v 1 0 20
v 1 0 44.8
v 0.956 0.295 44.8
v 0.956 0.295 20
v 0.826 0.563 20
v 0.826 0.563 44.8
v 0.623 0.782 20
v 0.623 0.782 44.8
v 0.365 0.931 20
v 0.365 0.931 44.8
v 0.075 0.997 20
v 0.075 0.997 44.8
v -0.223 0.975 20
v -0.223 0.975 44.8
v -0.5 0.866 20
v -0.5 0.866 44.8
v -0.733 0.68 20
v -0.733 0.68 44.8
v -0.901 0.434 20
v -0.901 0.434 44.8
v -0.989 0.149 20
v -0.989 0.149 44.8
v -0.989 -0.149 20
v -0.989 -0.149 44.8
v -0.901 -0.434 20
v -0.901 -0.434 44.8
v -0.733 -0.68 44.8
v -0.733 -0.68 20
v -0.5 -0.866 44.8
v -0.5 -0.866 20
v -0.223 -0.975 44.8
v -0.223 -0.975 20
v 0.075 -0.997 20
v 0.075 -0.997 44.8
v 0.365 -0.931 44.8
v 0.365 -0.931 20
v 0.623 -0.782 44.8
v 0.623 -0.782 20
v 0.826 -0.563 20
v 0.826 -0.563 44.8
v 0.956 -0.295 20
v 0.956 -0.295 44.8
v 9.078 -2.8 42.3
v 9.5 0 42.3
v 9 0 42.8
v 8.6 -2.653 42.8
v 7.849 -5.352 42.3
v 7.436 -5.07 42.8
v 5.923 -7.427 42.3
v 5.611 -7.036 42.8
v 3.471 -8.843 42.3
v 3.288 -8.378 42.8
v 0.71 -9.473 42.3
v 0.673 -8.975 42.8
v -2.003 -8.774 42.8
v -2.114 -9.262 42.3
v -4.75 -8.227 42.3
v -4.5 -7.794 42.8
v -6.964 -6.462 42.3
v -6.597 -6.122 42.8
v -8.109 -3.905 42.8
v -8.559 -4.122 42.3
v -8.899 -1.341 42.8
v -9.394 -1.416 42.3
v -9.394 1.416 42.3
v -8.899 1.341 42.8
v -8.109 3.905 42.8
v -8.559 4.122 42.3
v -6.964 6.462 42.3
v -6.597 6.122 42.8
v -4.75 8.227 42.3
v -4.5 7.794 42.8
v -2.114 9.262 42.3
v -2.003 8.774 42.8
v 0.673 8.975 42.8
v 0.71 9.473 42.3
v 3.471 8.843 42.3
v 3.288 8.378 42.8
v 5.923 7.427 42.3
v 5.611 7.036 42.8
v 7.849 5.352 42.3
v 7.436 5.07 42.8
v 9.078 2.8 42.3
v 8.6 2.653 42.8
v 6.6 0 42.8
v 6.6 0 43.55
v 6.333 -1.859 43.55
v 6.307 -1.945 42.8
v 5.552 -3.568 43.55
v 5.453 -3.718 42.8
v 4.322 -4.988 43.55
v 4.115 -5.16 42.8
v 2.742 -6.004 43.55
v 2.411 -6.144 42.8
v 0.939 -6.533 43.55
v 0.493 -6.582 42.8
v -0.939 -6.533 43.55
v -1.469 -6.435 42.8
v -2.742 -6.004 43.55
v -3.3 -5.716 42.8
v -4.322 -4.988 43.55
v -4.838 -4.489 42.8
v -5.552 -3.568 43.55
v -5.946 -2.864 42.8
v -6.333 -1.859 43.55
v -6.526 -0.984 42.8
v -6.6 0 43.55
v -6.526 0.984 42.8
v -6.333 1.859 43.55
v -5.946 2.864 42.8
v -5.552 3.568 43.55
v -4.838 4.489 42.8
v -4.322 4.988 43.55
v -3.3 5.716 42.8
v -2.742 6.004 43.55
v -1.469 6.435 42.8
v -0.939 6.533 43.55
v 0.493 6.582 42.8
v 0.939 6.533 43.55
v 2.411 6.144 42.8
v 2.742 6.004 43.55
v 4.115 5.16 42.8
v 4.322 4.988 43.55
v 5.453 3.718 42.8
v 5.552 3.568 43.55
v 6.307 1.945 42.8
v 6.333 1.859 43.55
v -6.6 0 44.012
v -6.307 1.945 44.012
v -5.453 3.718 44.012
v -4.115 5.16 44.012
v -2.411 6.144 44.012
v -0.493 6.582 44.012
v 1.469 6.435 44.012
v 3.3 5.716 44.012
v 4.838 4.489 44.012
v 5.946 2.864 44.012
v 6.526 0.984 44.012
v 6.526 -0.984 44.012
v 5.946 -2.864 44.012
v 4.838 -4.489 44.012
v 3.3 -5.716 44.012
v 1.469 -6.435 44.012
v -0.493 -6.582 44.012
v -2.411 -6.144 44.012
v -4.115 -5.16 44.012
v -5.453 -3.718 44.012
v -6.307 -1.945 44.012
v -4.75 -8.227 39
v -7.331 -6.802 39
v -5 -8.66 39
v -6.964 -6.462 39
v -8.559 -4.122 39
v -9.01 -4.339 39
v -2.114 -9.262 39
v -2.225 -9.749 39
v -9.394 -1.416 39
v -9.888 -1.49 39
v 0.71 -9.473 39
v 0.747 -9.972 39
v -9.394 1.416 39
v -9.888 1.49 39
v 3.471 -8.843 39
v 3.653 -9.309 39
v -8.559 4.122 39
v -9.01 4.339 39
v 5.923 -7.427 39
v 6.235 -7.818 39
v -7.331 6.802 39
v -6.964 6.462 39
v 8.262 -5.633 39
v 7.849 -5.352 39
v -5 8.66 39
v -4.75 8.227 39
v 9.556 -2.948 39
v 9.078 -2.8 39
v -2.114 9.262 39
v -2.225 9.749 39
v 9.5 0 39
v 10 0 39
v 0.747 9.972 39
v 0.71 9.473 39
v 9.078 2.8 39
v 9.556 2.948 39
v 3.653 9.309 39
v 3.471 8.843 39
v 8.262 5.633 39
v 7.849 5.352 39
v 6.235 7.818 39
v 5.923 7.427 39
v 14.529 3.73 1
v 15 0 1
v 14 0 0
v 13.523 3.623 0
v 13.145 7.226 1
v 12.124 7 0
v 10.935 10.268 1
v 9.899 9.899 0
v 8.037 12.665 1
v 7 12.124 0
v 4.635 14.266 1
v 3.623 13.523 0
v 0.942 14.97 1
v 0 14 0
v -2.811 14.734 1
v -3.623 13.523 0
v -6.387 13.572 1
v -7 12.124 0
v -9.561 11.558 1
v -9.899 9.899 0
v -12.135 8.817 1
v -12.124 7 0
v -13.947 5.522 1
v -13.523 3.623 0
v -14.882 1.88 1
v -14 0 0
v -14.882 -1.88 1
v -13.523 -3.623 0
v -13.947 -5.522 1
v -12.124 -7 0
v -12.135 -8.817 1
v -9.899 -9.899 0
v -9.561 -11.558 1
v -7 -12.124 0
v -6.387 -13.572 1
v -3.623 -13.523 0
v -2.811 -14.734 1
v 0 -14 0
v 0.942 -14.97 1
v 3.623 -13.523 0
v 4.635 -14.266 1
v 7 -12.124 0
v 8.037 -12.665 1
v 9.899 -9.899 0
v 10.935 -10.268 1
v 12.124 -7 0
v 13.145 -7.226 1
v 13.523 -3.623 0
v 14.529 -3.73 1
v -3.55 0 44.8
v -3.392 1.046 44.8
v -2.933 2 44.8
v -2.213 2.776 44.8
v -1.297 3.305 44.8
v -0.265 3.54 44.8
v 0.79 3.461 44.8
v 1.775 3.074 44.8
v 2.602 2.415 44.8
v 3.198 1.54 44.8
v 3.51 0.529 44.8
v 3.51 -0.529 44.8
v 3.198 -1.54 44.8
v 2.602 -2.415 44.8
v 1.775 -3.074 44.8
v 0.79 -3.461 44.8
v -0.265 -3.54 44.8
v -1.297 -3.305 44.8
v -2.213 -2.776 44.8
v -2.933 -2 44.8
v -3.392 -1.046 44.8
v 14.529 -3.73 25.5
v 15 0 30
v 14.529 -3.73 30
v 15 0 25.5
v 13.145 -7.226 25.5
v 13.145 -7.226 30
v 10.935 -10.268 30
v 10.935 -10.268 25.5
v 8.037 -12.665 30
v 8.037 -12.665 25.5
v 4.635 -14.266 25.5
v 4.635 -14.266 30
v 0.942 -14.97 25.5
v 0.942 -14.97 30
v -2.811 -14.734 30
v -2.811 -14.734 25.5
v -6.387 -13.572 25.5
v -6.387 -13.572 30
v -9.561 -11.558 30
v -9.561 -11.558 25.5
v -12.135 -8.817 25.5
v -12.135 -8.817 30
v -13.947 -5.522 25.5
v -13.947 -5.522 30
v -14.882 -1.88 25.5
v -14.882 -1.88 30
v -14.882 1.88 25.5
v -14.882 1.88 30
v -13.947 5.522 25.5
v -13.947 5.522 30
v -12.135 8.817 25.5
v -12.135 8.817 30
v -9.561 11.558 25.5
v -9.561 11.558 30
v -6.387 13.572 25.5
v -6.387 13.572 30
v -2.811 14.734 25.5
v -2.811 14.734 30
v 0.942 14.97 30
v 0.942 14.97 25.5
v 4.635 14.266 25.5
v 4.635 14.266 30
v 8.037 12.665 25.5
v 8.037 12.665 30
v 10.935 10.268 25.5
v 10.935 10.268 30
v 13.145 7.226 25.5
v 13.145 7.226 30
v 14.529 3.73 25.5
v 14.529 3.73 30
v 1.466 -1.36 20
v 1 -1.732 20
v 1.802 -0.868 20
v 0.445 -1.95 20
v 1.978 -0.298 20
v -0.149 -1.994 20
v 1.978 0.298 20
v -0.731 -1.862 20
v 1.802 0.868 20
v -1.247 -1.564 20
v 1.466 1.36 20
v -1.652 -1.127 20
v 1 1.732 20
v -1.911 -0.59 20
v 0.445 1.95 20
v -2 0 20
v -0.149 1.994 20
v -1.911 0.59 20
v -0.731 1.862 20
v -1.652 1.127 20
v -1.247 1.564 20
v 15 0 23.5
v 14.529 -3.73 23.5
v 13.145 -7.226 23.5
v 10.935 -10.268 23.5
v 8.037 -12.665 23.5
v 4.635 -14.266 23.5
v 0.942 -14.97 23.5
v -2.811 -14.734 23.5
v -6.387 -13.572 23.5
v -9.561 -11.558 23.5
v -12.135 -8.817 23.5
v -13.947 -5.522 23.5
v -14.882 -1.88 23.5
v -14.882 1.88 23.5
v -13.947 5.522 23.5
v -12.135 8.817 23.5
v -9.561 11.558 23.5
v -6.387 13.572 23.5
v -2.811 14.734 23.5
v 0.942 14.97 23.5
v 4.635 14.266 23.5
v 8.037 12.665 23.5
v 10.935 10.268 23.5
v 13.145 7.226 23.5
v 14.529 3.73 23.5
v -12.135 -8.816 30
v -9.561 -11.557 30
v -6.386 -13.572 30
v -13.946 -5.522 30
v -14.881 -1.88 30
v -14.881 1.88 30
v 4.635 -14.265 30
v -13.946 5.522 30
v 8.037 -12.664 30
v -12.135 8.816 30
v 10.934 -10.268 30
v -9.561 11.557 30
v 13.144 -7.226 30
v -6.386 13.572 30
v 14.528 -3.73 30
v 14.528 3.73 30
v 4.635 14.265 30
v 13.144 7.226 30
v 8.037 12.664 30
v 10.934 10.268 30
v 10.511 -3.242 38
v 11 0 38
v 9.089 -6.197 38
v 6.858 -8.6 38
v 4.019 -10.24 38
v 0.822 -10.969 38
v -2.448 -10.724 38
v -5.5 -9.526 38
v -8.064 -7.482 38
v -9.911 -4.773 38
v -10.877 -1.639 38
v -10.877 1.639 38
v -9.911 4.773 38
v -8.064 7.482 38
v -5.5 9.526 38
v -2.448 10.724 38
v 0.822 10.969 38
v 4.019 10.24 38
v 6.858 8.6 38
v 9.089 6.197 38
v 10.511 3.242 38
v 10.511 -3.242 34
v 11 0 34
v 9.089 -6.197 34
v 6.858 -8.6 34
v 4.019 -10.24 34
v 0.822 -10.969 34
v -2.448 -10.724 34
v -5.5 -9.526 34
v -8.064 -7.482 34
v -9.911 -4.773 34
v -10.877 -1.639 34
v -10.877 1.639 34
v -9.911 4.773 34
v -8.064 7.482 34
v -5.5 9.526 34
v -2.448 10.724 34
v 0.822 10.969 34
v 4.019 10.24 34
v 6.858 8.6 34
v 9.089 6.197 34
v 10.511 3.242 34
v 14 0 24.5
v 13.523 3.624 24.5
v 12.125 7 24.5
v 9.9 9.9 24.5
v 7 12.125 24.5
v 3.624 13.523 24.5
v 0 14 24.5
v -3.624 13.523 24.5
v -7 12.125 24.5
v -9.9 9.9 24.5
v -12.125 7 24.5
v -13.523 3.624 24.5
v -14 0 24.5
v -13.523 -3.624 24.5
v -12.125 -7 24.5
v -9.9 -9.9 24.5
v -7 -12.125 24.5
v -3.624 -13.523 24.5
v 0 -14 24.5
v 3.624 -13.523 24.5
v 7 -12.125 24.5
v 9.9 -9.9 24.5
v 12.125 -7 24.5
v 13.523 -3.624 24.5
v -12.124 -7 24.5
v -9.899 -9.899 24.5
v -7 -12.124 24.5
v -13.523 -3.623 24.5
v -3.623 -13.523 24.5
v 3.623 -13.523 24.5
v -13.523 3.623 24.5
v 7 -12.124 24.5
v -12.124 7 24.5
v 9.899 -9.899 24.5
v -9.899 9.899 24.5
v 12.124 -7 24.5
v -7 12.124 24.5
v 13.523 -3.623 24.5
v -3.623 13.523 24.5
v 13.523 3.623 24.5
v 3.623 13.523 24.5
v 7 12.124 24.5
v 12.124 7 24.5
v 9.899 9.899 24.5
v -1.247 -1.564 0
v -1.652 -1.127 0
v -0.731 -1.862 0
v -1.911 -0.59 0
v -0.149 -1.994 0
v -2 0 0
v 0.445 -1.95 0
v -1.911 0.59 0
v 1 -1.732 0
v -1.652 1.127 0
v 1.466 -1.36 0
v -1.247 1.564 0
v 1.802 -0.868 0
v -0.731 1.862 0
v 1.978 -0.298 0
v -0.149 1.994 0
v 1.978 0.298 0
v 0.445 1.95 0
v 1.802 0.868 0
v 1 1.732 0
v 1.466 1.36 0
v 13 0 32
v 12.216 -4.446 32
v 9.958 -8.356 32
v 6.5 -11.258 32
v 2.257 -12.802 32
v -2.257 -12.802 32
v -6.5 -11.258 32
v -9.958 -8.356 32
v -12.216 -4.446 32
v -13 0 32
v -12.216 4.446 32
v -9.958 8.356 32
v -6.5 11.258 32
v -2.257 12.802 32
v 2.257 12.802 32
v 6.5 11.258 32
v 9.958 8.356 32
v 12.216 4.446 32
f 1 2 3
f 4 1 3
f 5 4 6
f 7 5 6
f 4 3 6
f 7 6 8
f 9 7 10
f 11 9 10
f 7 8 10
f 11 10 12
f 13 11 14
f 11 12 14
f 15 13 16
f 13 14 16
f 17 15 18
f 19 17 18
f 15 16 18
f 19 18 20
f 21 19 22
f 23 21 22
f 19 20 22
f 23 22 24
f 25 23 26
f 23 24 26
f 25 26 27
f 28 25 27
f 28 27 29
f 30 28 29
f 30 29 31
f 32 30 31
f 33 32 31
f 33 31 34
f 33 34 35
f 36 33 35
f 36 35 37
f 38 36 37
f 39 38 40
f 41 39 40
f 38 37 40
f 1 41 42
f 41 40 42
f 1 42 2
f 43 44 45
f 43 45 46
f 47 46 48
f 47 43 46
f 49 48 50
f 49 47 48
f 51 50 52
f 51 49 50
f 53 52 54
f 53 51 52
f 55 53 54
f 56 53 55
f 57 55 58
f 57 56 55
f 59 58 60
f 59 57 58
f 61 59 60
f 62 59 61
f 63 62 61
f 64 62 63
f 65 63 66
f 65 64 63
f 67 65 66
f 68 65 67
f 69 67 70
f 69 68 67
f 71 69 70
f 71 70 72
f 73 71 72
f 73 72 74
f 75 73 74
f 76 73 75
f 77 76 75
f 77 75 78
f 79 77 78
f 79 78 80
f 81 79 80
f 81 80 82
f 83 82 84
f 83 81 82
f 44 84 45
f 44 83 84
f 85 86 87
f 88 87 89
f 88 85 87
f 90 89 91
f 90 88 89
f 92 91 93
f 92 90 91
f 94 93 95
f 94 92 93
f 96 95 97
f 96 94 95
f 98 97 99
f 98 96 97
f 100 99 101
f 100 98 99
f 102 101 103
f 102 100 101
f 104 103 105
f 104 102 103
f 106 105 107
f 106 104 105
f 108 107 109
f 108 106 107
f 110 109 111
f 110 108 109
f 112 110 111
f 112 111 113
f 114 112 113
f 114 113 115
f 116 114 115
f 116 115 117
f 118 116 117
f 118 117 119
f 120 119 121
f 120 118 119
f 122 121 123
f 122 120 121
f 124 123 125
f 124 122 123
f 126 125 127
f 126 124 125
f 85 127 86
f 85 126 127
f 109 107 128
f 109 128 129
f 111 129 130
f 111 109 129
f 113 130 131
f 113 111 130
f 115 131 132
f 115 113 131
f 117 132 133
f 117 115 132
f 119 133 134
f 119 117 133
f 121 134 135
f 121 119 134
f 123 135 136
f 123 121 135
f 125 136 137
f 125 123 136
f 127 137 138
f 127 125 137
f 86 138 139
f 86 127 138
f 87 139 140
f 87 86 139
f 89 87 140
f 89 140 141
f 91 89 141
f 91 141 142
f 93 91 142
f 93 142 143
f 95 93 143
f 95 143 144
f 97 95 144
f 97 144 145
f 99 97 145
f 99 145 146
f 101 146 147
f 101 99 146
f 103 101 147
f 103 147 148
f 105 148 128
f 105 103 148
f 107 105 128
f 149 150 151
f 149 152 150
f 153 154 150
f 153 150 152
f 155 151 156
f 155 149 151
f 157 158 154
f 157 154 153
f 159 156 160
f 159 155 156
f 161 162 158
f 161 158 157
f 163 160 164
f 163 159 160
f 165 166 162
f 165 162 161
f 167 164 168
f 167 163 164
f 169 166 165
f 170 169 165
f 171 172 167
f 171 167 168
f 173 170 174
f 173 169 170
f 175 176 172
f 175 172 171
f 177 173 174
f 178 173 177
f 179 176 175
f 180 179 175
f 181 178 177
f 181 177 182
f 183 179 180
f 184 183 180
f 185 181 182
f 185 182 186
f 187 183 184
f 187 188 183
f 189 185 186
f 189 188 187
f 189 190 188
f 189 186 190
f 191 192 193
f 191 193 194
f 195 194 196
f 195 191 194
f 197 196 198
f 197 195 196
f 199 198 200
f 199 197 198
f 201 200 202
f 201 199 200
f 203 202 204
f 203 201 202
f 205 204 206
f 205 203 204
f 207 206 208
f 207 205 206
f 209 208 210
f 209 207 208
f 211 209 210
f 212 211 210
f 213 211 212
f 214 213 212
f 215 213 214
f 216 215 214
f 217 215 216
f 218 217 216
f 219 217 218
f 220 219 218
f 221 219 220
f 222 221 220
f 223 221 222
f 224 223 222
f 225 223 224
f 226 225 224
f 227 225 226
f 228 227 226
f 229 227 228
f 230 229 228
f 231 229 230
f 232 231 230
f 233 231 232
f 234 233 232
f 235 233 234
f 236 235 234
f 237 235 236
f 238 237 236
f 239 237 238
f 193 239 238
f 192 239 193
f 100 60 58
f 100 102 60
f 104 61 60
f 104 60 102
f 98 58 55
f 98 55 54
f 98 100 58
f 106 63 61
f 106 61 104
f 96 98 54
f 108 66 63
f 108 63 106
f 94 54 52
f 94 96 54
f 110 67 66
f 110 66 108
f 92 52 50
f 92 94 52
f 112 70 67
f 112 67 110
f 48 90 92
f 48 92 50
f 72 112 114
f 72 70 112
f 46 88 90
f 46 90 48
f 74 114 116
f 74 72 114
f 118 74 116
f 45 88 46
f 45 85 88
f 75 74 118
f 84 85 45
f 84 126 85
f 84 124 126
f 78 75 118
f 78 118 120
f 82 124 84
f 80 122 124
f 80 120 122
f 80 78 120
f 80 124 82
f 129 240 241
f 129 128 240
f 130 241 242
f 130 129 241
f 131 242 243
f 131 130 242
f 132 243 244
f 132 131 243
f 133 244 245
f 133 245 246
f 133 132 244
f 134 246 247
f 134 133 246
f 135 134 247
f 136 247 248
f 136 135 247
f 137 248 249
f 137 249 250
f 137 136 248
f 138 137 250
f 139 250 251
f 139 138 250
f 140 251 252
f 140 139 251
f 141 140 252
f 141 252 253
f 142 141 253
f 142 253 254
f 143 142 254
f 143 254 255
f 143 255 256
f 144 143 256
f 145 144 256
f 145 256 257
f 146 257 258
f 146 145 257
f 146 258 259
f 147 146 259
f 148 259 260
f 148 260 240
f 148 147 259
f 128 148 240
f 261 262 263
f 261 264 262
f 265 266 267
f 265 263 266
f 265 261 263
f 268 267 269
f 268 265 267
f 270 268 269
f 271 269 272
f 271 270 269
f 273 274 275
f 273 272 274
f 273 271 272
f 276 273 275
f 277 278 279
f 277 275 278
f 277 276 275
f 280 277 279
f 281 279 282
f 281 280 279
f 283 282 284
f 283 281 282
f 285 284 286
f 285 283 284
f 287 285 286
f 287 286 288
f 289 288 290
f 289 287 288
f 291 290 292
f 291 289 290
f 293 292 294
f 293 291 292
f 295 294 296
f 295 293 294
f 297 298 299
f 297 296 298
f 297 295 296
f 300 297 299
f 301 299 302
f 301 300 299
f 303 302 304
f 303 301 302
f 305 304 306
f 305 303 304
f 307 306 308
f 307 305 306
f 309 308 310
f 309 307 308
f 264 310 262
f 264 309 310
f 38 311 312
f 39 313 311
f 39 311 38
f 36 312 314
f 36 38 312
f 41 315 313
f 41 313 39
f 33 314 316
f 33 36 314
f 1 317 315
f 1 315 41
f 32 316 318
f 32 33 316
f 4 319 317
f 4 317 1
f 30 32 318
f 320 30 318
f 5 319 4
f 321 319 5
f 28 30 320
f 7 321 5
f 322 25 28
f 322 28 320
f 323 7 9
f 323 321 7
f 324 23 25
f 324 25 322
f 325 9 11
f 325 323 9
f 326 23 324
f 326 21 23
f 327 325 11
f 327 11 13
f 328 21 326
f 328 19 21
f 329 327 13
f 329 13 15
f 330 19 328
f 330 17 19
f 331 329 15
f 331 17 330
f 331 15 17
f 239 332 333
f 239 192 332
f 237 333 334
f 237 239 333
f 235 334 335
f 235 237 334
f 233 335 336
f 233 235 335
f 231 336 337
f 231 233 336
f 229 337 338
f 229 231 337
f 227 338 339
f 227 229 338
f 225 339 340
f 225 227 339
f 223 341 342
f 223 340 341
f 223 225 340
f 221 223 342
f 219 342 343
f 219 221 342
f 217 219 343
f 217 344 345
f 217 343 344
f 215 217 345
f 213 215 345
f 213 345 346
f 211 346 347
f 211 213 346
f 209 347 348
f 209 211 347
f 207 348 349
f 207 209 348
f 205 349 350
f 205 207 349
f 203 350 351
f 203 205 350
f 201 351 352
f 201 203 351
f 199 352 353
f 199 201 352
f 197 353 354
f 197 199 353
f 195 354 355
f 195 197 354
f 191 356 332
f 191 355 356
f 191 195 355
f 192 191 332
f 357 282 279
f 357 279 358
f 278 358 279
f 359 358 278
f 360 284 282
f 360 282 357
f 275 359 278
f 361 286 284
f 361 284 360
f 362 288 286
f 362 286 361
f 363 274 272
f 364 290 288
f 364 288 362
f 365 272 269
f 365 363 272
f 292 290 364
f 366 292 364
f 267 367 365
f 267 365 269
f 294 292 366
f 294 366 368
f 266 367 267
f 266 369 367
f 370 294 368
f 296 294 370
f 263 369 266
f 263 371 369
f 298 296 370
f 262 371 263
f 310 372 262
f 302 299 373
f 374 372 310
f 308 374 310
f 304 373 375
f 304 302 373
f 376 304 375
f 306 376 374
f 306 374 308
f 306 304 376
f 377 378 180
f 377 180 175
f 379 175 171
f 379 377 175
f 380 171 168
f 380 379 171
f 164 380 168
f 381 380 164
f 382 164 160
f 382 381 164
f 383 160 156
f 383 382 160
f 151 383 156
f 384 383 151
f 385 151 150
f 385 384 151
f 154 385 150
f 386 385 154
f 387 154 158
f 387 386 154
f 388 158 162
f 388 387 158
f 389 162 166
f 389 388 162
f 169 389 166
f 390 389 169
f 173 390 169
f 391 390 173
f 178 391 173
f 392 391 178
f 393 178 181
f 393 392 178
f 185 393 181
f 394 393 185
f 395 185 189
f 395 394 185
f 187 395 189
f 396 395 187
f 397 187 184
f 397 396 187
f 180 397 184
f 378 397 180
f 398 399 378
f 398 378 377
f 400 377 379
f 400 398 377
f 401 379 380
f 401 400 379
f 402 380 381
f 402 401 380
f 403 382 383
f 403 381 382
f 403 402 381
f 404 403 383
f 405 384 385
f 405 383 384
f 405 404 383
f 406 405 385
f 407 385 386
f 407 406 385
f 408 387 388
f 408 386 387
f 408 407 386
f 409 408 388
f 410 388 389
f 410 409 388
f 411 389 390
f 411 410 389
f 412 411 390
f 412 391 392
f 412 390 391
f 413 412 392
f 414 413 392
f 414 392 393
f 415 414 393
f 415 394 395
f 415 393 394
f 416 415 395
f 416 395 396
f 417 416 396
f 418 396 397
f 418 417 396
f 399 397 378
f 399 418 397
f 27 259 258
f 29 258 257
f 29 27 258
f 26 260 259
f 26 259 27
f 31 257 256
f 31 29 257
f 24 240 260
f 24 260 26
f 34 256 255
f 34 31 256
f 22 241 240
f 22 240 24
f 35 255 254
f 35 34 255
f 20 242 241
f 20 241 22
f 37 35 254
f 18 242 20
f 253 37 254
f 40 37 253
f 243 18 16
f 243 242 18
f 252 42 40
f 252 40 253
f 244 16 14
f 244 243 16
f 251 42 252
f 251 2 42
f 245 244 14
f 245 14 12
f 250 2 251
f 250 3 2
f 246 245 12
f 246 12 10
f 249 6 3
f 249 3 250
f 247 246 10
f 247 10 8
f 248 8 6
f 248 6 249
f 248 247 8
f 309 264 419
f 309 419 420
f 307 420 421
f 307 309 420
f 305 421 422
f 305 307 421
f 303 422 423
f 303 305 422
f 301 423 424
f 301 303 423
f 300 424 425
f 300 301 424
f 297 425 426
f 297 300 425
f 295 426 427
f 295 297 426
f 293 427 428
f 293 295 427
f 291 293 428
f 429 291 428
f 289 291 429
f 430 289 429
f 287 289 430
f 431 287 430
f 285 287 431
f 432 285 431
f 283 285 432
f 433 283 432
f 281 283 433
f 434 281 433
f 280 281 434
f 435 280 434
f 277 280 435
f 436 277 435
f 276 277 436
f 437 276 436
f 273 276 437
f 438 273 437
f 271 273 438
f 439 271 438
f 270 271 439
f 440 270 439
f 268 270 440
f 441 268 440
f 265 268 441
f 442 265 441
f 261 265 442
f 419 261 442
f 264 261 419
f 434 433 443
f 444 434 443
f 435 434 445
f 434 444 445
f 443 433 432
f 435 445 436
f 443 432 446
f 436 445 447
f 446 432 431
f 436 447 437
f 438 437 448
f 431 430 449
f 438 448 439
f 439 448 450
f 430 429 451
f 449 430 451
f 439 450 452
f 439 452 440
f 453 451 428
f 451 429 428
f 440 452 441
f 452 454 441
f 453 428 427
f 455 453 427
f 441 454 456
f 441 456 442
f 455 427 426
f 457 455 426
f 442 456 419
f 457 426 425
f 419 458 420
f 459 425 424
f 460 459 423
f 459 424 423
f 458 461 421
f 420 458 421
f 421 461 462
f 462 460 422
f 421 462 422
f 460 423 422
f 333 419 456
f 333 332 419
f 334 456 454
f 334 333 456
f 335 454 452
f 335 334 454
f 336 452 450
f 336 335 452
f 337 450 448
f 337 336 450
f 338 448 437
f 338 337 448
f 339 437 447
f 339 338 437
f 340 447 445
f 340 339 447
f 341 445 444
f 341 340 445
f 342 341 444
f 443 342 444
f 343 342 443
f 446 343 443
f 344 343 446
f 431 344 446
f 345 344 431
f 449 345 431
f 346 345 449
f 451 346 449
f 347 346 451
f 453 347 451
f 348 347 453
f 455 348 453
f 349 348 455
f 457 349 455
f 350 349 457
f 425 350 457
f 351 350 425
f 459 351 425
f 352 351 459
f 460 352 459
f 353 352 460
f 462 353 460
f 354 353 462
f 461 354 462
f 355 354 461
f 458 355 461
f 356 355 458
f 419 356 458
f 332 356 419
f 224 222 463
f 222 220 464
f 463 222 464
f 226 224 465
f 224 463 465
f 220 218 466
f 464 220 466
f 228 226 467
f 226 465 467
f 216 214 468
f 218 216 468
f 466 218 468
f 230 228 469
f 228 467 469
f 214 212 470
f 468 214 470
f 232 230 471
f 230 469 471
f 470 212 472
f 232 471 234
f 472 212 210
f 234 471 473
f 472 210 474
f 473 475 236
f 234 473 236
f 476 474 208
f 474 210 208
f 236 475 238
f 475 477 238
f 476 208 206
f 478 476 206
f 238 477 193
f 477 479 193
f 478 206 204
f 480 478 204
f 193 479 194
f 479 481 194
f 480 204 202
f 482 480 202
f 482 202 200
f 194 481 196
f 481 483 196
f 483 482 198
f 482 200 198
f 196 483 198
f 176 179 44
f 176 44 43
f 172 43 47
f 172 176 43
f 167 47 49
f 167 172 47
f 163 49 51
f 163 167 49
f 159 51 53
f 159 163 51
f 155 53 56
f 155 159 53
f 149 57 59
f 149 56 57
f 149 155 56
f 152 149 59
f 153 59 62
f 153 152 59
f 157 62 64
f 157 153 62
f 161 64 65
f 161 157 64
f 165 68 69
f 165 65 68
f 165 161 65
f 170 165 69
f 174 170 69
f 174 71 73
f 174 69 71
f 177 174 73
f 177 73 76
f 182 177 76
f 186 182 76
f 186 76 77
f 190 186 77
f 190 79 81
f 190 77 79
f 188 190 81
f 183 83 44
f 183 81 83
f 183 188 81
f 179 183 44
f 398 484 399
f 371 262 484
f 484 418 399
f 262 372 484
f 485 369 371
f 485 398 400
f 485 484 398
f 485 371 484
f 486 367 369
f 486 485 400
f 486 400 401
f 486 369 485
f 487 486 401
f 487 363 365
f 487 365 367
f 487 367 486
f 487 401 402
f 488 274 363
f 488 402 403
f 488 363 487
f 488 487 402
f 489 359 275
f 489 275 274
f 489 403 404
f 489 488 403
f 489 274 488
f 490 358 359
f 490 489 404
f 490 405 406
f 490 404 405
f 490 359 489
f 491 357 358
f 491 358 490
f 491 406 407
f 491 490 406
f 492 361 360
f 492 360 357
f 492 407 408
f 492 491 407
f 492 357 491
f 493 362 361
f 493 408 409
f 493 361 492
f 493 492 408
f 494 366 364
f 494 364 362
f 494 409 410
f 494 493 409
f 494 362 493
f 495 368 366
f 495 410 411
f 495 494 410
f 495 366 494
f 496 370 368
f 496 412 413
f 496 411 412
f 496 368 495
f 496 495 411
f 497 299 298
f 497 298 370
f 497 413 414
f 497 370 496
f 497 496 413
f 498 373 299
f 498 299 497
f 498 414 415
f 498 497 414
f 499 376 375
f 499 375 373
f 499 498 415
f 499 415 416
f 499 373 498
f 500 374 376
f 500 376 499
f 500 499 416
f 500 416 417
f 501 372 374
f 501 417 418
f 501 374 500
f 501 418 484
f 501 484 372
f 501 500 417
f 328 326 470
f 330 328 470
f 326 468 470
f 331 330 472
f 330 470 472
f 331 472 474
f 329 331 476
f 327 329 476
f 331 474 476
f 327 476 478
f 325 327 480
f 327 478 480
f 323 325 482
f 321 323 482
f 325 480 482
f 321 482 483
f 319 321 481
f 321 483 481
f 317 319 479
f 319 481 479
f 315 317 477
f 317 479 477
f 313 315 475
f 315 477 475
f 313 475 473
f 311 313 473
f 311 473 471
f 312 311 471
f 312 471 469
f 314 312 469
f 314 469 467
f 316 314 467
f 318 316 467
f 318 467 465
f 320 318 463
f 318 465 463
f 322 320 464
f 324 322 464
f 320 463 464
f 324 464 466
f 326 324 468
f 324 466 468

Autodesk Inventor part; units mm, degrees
ref_plane "YZ Plane" through (0, 0, 0) normal (1, 0, 0) x (0, 1, 0)
ref_plane "XZ Plane" through (0, 0, 0) normal (0, 1, 0) x (-1, 0, 0)
ref_plane "XY Plane" through (0, 0, 0) normal (0, 0, 1) x (1, 0, 0)
sketch "Sketch1" plane through (0, 0, 0) normal (0, 0, 1) x (1, 0, 0)
  circle A0 centre (0, 0) radius 15
  dimension "d0" = 30
extrude "Extrusion1" add sketch "Sketch1" along normal blind 24.5
chamfer "Chamfer1" distance 1 angle 45 2 edges at (-15, 0, 24.5) (-15, 0, 0)
sketch "Sketch2" plane through (0, 0, 24.5) normal (0, 0, 1) x (1, 0, 0)
  circle A0 centre (0, 0) radius 15
  dimension "d6" = 30
extrude "Extrusion2" add sketch "Sketch2" along normal blind 5.5
chamfer "Chamfer2" distance 1 angle 45 1 edges at (-15, 0, 24.5)
sketch "Sketch3" plane through (0, 0, 30) normal (0, 0, 1) x (1, 0, 0)
  circle A0 centre (0, 0) radius 11
  dimension "d12" = 22
extrude "Extrusion3" add sketch "Sketch3" along normal blind 4
chamfer "Chamfer3" distance 4 angle 45 1 edges at (-11, 0, 30)
sketch "Sketch4" plane through (0, 0, 34) normal (0, 0, 1) x (1, 0, 0)
  circle A0 centre (0, 0) radius 11
  dimension "d18" = 22
extrude "Extrusion4" add sketch "Sketch4" along normal blind 5
sketch "Sketch5" plane through (0, 0, 39) normal (0, 0, 1) x (1, 0, 0)
  circle A0 centre (0, 0) radius 9.5
  dimension "d21" = 19
extrude "Extrusion5" add sketch "Sketch5" along normal blind 3.8
chamfer "Chamfer4" distance 1 angle 45 1 edges at (-11, 0, 39)
sketch "Sketch6" plane through (0, 0, 42.8) normal (0, 0, 1) x (1, 0, 0)
  circle A0 centre (0, 0) radius 6.6
  dimension "d27" = 13.2
extrude "Extrusion6" add sketch "Sketch6" along normal blind 0.75
sketch "Sketch7" plane through (0, 0, 43.55) normal (0, 0, 1) x (1, 0, 0)
  circle A0 centre (0, 0) radius 3.55
  dimension "d30" = 7.1
extrude "Extrusion7" add sketch "Sketch7" along normal blind 1.25
sketch "Sketch8" plane through (0, 0, 0) normal (0, 1, 0) x (-1, 0, 0)
  line L0 (3.55, 44.8) -> (-3.55, 44.8) projected
  line L1 (3.55, 44.8) -> (6.6, 44.0124)
  line L2 (3.55, 44.8) -> (6.7001, 44.8) construction
  line L3 (6.6, 43.55) -> (-6.6, 43.55) projected
  line L4 (6.6, 44.0124) -> (6.6, 43.55)
  line L5 (6.6, 43.55) -> (3.55, 43.55)
  line L6 (3.55, 43.55) -> (3.55, 44.8) projected
  line L7 (3.55, 44.8) -> (3.55, 43.7812)
  line L8 (0, -8.96) -> (0, 53.76) projected
  point P0 (0, 0)
  dimension "d33" = 14.48
revolve "Revolution1" add sketch "Sketch8" angle 360 about axis through (0, 0, -10) along (0, 0, 1) contours L1 L4 L3 L6
sketch "Sketch9" plane through (0, 0, 44.8) normal (0, 0, 1) x (1, 0, 0)
  circle A0 centre (0, 0) radius 1
  dimension "d35" = 2
extrude "Extrusion8" cut sketch "Sketch9" against normal blind 50
sketch "Sketch10" plane through (0, 0, 0) normal (0, 0, -1) x (-1, 0, 0)
  circle A0 centre (0, 0) radius 2
  dimension "d38" = 4
extrude "Extrusion9" cut sketch "Sketch10" against normal blind 20
chamfer "Chamfer5" distance 0.5 angle 45 1 edges at (-9.5, 0, 42.8)
properties part number "210505 - Zeiss x100 objective mockup"
